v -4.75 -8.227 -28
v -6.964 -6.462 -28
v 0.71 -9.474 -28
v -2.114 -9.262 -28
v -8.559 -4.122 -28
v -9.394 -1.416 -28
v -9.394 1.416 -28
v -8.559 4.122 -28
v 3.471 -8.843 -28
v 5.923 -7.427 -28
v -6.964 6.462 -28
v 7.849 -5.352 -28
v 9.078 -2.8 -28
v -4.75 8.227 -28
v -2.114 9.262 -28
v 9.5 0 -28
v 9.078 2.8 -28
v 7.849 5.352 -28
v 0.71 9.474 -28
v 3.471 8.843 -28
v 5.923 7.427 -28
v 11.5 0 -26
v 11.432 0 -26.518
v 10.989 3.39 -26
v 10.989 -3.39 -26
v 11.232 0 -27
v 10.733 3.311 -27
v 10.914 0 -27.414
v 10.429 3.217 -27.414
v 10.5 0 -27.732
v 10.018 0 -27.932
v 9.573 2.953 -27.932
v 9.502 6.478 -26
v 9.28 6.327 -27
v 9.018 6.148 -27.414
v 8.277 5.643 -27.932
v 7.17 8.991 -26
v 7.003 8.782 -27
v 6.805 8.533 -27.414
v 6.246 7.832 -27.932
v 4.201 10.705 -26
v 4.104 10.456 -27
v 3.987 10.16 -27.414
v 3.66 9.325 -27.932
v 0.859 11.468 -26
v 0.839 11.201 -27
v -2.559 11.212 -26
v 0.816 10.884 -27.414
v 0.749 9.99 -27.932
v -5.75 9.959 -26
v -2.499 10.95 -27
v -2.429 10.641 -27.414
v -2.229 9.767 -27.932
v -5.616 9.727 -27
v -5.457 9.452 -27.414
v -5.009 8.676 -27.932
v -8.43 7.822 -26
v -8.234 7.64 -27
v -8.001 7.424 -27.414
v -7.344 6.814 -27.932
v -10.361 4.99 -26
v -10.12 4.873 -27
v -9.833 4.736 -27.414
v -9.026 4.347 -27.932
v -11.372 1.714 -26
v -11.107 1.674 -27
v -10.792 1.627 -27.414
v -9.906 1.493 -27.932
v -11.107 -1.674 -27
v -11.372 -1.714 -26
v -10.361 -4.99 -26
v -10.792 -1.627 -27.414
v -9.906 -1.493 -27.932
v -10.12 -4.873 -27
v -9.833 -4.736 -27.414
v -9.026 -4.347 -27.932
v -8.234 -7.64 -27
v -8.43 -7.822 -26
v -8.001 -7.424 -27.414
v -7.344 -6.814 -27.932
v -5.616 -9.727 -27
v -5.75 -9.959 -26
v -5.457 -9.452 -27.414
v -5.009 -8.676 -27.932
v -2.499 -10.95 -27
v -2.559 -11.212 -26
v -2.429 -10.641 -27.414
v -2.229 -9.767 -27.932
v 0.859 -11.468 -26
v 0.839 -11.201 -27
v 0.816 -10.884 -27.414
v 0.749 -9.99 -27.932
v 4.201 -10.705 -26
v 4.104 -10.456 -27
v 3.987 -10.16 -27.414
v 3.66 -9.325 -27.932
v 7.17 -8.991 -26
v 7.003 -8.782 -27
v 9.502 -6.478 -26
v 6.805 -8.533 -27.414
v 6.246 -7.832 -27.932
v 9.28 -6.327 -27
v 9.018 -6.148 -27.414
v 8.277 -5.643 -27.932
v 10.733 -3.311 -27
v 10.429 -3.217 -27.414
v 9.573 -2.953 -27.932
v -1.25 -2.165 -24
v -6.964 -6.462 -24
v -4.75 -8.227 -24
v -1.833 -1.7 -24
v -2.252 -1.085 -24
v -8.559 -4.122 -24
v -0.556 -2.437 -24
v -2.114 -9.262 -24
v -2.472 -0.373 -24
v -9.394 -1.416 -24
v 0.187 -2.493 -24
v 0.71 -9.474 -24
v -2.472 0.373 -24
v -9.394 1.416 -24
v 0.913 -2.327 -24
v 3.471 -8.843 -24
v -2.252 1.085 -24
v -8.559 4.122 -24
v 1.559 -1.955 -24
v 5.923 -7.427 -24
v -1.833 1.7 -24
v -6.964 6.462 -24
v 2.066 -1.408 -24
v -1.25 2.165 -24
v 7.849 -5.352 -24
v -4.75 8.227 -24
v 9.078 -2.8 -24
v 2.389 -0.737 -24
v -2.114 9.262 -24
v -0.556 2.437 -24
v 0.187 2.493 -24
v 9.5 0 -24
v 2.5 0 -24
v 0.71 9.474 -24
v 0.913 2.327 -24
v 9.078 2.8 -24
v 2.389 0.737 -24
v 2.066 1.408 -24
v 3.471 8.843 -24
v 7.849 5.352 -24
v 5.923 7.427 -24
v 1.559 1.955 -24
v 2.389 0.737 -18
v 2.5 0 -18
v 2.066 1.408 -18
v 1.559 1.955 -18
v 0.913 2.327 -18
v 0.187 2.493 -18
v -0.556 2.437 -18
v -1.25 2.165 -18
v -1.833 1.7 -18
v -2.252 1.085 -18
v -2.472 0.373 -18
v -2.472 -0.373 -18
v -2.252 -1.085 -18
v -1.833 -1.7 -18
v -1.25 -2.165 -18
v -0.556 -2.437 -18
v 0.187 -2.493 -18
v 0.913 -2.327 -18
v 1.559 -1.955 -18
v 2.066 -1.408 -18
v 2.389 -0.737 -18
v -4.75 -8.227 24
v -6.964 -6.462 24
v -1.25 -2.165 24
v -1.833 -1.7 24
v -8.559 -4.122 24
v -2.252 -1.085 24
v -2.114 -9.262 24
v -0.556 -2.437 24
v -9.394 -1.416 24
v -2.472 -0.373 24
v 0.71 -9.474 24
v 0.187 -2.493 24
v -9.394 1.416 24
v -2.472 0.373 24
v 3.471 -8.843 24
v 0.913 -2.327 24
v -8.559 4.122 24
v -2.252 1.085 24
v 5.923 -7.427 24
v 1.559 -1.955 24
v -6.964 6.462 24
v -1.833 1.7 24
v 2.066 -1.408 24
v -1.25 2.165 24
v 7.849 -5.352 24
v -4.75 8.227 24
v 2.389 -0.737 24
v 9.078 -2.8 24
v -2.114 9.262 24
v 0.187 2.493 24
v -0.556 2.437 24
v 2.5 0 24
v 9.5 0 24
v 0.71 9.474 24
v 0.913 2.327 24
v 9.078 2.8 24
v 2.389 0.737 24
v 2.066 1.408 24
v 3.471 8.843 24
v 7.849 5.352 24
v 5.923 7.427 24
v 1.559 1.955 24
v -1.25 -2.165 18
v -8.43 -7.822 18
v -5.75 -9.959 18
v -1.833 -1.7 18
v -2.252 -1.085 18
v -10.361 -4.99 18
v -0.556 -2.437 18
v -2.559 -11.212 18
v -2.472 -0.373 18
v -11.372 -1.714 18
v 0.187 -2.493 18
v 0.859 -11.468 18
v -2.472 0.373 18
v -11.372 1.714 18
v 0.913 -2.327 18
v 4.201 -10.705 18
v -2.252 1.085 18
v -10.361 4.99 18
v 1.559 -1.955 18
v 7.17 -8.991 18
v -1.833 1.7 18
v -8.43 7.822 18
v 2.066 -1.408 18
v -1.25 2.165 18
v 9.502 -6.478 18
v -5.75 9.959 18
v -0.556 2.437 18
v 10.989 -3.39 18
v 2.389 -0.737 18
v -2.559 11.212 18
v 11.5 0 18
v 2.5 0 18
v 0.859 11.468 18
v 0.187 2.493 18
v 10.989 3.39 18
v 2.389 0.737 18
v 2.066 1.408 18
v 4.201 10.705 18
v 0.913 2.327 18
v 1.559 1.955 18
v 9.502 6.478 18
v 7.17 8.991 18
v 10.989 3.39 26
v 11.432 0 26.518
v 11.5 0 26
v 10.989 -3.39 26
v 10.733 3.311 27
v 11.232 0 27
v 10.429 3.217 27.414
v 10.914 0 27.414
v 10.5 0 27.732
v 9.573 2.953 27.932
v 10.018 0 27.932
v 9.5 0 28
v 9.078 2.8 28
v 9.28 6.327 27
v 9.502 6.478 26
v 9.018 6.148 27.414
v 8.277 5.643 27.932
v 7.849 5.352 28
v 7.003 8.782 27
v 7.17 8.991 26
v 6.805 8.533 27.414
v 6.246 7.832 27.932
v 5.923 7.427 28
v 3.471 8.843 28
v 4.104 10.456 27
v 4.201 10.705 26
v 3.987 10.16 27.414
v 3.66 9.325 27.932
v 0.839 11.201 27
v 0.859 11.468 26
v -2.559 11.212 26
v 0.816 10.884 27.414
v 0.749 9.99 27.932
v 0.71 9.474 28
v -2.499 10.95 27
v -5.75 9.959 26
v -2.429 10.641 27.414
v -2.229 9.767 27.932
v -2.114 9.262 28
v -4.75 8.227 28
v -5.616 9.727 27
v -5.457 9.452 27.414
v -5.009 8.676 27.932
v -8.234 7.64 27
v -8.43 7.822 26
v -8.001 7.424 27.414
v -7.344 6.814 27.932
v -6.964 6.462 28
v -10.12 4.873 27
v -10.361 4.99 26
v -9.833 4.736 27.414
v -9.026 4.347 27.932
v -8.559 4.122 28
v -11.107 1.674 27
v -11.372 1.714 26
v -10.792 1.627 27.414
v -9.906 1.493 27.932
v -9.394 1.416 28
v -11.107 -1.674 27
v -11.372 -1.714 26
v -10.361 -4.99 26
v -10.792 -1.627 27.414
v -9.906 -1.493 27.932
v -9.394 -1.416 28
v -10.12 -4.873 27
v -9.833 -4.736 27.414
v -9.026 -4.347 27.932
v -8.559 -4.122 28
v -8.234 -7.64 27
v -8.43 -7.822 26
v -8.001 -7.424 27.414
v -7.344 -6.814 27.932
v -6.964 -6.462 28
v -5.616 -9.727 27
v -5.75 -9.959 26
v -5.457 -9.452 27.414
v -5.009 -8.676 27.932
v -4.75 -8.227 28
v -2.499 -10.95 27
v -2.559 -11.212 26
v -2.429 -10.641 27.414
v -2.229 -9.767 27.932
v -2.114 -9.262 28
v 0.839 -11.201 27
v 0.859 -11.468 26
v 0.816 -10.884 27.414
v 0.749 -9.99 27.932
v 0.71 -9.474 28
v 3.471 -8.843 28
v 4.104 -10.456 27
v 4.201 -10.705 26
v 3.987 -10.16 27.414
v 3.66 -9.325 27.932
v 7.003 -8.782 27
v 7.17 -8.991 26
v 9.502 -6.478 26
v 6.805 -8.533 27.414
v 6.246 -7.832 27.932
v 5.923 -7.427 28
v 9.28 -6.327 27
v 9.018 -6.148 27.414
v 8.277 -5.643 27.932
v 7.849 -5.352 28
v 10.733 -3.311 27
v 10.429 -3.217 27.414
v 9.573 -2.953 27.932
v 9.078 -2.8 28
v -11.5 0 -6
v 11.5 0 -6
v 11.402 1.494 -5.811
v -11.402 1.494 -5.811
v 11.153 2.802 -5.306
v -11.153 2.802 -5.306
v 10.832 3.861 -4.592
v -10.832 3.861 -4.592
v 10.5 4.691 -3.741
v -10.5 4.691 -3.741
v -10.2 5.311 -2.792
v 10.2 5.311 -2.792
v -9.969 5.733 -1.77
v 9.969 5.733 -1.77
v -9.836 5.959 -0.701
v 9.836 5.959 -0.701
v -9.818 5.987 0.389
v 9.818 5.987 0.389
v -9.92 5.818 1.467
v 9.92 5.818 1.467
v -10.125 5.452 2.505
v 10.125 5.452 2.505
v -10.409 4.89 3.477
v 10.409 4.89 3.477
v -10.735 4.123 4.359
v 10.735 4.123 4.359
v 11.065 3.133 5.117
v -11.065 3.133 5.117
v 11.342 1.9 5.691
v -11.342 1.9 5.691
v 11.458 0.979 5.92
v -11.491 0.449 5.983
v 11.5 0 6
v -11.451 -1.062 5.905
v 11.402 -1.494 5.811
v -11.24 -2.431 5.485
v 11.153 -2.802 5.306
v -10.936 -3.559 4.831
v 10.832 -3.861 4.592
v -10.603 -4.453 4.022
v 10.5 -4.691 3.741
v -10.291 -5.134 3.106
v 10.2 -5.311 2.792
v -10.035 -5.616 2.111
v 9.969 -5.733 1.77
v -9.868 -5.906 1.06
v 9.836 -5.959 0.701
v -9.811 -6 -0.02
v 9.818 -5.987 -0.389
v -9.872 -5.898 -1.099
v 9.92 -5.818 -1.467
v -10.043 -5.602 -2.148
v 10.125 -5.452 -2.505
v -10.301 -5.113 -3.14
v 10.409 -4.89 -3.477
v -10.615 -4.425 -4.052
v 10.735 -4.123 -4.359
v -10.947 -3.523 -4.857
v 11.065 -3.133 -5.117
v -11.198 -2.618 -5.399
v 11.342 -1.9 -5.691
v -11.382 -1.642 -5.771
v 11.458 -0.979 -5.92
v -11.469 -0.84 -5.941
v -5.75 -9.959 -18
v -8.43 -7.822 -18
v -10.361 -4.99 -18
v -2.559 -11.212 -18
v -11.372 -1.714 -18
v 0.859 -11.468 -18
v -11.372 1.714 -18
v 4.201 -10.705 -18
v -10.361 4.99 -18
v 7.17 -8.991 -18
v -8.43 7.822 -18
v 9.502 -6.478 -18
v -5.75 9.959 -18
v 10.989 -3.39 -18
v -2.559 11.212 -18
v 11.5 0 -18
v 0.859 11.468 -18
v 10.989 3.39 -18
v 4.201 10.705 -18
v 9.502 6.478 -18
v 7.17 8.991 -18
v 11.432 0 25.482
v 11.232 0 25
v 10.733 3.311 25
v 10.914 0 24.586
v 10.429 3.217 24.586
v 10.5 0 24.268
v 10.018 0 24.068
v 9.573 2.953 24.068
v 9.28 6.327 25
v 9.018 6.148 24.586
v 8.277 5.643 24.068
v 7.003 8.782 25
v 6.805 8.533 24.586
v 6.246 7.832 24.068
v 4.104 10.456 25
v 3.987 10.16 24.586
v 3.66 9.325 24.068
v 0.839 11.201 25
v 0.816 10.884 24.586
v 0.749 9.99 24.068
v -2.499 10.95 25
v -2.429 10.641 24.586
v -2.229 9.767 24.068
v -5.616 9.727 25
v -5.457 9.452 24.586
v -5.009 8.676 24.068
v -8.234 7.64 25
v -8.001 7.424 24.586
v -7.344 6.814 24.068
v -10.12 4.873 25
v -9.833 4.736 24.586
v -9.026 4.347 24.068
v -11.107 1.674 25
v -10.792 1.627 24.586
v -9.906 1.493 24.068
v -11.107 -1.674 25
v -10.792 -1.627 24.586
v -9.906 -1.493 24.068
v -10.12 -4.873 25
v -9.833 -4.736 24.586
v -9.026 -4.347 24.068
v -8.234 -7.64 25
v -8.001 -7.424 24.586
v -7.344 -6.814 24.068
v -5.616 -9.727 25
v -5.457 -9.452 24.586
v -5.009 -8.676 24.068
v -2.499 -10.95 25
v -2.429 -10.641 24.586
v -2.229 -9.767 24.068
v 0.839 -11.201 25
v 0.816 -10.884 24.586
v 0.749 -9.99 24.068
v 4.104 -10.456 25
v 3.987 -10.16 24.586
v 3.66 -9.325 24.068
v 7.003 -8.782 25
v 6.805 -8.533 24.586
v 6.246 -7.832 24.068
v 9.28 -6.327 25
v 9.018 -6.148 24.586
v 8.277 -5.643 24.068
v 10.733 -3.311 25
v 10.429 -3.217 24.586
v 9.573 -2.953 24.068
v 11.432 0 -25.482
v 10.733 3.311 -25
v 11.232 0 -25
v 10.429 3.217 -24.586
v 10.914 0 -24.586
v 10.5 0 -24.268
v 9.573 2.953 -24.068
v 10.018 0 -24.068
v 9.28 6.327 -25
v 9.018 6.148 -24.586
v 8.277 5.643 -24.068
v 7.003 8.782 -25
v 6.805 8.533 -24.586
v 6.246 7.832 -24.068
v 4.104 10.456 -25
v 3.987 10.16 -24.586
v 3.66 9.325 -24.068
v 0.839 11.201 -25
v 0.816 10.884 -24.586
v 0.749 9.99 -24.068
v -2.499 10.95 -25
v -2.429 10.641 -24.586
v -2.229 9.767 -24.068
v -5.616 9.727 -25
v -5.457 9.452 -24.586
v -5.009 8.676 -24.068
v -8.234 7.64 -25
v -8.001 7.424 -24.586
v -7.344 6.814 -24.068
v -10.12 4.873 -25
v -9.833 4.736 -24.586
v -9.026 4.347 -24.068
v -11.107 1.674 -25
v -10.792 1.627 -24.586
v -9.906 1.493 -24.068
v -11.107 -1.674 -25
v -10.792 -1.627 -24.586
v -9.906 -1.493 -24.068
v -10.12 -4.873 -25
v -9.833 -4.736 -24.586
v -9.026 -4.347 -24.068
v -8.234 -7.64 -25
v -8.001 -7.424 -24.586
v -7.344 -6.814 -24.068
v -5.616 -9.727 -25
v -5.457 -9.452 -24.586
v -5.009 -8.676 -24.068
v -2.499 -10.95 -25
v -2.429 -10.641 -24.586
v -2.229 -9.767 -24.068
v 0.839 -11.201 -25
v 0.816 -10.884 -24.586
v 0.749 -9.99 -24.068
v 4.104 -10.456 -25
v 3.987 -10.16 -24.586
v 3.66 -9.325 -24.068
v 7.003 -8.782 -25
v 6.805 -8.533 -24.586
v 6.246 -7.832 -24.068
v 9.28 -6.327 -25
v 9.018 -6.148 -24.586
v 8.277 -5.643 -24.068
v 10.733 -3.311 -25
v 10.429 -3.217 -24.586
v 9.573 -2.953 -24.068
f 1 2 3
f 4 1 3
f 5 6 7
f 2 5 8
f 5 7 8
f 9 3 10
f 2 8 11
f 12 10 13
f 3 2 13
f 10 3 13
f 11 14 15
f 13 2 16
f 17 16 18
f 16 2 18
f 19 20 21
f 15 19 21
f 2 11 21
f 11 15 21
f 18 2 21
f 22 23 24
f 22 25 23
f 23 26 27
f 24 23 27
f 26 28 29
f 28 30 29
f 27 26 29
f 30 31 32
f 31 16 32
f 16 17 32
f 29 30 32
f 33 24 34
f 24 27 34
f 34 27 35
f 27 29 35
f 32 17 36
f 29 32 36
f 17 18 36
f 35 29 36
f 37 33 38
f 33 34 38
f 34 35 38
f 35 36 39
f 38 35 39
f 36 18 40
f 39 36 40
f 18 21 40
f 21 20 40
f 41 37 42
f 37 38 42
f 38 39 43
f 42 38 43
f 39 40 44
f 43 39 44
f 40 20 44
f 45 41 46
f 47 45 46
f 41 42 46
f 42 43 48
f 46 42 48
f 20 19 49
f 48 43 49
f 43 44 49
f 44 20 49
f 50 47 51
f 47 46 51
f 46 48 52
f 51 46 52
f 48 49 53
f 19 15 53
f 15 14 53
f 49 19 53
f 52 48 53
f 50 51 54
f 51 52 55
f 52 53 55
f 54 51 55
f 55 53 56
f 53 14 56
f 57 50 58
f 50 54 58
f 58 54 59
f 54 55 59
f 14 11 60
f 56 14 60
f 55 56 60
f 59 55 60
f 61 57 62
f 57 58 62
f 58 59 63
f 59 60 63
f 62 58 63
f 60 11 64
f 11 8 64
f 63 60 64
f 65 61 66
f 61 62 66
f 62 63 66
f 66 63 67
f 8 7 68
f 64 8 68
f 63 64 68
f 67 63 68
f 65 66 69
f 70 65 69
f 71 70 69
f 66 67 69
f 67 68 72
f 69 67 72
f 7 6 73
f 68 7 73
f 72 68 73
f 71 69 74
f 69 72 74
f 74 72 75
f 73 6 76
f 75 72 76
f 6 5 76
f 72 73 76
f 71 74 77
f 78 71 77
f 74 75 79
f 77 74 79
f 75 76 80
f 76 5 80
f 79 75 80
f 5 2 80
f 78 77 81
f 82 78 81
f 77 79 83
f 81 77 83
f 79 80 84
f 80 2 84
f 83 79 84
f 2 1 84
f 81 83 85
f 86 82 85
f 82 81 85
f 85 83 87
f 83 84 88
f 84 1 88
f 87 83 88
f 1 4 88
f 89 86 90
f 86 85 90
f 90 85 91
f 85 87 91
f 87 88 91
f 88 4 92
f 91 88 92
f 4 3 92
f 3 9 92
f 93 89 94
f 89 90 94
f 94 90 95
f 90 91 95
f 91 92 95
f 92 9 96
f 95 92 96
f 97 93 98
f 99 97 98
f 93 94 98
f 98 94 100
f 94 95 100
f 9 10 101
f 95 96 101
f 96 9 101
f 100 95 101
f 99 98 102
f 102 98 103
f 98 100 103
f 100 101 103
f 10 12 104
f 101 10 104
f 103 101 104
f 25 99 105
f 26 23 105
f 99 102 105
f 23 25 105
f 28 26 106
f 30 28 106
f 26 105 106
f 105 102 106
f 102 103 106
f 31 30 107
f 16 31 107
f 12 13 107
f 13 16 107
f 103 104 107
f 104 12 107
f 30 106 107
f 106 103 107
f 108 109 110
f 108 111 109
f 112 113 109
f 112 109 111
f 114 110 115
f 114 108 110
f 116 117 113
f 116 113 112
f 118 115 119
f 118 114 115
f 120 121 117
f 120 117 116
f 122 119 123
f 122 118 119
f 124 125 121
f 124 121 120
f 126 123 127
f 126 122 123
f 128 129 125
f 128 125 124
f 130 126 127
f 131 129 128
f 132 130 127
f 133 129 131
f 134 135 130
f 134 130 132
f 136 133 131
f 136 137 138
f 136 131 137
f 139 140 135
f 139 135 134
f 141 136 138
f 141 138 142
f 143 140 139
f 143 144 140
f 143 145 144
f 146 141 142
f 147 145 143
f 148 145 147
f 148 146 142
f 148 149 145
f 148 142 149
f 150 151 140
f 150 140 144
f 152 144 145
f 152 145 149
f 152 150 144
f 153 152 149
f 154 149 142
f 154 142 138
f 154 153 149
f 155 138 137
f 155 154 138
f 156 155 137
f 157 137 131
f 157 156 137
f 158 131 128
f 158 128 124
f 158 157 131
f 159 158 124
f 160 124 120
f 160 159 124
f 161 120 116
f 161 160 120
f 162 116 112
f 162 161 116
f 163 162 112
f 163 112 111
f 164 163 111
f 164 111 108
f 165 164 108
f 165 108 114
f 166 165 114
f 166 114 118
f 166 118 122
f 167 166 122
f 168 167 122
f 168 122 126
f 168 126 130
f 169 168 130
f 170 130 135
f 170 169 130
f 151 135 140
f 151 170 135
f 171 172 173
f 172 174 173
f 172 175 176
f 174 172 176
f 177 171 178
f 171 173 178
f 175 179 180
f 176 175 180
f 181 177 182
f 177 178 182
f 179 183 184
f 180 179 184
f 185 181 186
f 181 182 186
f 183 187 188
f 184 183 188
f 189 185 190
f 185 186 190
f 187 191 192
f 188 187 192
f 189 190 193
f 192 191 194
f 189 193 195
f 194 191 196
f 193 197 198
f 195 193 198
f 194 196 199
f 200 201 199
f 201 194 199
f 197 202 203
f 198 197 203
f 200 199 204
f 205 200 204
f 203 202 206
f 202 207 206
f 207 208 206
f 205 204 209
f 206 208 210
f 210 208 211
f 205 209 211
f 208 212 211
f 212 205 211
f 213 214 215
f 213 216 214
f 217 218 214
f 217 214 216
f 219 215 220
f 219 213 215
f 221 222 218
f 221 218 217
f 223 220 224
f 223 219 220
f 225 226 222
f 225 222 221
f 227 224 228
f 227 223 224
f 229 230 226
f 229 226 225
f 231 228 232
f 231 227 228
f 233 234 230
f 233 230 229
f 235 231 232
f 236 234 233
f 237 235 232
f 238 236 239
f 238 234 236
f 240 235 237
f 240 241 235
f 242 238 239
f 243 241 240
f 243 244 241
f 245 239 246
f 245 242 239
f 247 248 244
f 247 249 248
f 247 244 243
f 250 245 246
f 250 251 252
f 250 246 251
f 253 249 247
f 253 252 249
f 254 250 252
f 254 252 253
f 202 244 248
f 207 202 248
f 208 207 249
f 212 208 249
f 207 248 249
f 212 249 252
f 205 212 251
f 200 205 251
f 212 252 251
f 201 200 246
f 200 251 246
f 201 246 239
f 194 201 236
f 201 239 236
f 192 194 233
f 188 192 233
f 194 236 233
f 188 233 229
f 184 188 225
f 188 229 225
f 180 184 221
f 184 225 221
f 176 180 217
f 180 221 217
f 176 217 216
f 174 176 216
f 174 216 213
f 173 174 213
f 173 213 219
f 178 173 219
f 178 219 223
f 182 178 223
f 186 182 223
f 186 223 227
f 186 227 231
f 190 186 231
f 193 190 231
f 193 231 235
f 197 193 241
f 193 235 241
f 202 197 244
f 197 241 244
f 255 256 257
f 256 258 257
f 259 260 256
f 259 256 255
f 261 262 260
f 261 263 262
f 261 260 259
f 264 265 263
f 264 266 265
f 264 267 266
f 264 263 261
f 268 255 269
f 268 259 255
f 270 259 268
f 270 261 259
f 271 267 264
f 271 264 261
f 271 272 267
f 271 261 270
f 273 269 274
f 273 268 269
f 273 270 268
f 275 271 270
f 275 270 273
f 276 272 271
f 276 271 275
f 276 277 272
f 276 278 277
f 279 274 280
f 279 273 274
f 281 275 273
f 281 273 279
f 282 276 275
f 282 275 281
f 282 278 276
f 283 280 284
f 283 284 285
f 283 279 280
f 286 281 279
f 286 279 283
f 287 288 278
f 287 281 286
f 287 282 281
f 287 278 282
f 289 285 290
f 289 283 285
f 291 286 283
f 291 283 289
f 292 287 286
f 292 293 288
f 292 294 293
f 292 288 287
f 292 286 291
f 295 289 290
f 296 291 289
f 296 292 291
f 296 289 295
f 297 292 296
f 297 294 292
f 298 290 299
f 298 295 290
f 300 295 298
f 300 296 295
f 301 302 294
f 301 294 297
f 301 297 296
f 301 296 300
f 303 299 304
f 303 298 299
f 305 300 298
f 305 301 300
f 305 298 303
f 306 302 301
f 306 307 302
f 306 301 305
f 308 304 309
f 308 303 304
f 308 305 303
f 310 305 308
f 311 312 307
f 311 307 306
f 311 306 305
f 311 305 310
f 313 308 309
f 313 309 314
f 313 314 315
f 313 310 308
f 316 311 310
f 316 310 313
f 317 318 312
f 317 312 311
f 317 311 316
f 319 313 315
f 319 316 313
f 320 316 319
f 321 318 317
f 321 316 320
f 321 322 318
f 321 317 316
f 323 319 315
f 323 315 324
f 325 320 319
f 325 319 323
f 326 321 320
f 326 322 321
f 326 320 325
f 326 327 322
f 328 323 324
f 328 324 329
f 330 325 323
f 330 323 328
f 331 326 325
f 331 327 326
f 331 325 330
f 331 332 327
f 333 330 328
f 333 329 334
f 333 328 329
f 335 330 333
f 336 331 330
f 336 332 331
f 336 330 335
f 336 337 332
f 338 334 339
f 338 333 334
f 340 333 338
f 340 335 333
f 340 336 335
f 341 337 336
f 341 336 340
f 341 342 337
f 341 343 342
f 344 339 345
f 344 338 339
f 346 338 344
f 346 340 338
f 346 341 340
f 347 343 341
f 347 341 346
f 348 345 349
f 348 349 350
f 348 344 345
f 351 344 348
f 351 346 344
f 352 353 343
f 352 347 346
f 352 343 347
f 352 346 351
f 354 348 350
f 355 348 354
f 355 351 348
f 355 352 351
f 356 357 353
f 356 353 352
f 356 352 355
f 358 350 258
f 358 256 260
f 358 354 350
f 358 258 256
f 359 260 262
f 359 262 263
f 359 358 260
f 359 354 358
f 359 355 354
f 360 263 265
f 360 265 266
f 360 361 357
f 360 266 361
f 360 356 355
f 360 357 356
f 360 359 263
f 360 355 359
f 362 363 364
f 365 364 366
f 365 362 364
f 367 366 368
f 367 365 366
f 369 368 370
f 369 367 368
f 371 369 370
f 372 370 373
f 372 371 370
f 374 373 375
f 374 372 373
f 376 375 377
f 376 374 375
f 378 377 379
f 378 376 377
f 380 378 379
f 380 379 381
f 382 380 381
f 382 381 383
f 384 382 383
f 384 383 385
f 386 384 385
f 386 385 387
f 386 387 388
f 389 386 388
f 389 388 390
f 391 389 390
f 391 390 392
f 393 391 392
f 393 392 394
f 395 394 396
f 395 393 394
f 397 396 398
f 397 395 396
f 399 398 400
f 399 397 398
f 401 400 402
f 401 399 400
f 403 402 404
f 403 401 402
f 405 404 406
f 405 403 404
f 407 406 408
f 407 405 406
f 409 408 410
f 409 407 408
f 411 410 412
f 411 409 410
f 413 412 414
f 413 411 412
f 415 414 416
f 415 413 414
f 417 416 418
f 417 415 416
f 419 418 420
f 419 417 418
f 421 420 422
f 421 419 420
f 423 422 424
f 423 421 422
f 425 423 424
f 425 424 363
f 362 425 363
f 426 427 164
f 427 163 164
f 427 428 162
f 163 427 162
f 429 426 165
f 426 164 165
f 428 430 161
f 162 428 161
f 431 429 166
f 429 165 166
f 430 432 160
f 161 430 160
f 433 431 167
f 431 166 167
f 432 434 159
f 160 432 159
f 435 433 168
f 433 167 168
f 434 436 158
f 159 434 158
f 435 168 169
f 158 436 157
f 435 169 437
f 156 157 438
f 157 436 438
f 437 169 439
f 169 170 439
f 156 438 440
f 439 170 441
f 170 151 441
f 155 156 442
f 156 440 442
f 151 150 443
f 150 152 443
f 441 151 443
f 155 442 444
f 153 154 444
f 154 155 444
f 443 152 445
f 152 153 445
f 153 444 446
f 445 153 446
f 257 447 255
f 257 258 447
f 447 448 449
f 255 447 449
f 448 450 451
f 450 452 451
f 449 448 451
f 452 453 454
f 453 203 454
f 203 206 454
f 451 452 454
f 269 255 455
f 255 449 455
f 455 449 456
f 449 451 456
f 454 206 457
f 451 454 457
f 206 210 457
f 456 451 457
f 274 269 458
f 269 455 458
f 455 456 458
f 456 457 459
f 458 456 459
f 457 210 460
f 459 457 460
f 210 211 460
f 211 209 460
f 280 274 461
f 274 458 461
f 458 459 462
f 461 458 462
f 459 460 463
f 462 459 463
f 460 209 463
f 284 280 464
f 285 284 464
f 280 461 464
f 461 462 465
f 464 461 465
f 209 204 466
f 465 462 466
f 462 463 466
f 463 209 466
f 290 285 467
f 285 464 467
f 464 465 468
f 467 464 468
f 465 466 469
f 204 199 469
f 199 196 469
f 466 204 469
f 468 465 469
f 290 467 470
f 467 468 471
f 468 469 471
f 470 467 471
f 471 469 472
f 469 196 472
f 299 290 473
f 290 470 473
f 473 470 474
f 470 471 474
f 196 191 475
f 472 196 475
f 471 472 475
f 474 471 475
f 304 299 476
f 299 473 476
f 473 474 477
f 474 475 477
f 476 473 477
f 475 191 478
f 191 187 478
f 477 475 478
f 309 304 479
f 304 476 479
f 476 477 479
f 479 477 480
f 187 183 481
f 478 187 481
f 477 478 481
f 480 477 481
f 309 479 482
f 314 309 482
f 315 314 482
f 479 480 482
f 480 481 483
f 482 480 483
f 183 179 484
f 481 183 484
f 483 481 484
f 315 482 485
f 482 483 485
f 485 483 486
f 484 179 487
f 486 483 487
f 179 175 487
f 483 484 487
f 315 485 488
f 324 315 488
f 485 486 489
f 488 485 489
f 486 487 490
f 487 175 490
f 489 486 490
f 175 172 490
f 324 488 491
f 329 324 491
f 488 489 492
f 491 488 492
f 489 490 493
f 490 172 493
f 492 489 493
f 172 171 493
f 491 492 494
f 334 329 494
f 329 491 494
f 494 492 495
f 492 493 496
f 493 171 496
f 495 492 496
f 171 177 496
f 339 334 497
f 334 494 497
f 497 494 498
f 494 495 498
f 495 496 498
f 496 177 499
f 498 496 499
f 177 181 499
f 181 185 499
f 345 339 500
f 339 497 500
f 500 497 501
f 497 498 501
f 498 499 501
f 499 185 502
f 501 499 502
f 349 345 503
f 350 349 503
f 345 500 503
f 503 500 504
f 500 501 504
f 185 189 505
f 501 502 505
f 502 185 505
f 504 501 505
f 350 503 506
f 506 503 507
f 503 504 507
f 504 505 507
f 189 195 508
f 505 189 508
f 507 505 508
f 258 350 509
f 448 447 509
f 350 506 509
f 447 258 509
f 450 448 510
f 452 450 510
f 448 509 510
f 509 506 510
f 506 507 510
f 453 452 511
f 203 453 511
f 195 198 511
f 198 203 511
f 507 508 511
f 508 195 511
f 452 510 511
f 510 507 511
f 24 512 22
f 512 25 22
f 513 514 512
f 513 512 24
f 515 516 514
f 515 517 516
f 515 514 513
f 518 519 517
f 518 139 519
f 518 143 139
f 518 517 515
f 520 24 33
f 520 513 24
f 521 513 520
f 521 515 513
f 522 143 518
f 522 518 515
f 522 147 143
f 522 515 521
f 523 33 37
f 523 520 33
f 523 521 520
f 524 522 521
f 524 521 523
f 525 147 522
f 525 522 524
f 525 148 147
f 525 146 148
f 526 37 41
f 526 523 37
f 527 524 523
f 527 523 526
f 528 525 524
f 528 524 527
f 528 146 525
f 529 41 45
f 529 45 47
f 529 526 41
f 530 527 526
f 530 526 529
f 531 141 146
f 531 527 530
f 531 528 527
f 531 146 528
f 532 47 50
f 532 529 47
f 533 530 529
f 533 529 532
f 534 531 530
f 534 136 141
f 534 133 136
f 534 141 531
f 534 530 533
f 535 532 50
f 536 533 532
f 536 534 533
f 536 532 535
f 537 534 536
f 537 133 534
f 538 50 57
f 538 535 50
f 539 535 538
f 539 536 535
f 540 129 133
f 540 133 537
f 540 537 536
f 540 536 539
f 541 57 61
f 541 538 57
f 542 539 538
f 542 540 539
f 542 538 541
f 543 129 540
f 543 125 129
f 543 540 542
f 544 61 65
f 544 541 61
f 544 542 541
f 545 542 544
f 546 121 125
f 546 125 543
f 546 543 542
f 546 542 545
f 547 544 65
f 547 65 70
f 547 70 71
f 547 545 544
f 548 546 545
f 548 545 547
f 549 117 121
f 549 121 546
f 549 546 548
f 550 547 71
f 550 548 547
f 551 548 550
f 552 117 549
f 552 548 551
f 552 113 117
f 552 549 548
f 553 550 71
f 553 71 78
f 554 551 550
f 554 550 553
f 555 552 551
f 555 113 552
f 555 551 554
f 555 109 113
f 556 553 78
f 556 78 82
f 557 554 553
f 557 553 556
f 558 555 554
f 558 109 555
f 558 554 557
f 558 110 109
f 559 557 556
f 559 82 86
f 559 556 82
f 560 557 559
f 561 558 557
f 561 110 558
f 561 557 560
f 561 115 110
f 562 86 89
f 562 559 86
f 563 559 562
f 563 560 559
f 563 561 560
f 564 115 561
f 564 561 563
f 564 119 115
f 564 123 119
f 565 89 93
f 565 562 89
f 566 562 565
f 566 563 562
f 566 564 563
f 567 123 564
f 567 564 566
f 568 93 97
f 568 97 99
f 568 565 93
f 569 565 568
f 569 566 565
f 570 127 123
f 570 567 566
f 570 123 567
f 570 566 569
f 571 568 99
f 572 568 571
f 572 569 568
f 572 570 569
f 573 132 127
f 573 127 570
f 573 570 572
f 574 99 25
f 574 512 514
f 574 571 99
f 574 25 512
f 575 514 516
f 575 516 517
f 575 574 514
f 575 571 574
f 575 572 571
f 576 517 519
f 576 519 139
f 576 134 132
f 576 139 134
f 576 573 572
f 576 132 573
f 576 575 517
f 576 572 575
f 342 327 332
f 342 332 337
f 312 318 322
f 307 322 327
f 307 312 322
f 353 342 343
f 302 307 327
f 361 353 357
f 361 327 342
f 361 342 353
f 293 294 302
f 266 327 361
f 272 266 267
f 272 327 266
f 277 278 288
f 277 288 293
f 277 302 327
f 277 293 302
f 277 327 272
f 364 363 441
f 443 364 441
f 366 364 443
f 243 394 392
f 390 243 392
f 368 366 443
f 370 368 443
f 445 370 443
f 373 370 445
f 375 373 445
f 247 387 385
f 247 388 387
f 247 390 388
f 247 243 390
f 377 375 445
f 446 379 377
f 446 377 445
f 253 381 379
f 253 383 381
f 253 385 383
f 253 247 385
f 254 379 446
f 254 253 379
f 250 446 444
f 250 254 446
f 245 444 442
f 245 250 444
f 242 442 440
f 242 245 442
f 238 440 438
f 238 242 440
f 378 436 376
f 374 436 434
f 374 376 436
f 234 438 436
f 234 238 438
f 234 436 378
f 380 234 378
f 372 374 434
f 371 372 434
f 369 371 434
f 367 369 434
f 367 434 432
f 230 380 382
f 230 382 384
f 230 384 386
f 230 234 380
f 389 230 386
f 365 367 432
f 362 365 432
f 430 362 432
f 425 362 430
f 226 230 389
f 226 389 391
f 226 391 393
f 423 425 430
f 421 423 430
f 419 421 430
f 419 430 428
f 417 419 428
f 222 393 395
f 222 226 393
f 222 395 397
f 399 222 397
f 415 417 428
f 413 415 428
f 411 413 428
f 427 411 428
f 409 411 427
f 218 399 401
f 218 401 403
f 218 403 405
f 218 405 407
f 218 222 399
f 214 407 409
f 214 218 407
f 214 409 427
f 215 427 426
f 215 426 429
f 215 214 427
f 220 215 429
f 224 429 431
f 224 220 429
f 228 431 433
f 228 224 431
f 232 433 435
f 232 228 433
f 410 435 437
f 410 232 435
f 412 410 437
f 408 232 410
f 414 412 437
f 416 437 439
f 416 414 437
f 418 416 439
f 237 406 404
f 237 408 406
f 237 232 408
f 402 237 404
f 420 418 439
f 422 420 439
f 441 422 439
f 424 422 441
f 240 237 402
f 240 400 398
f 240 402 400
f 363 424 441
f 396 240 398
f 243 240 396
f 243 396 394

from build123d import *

# Parameters (mm, degrees)
SKETCH1_R               = 11.5
BOSS_EXTRUDE1_DEPTH     = 18
SKETCH2_R               = 2.5
BOSS_EXTRUDE2_DEPTH     = 6
SKETCH3_R               = 11.5
BOSS_EXTRUDE3_DEPTH     = 4
FILLET1_R               = 2
CUT_EXTRUDE2_DEPTH      = 33.380549753
CUT_EXTRUDE2_DEPTH_BACK = 33.380549753
SKETCH5_R               = 6


with BuildPart() as part:
    # Sketch1 → Boss-Extrude1 (new body)
    with BuildSketch(Plane.XY):
        Circle(SKETCH1_R)
    extrude(amount=BOSS_EXTRUDE1_DEPTH)

    # Sketch2 → Boss-Extrude2 (add)
    with BuildSketch(Plane.XY.offset(18)):
        Circle(SKETCH2_R)
    extrude(amount=BOSS_EXTRUDE2_DEPTH)

    # Sketch3 → Boss-Extrude3 (add)
    with BuildSketch(Plane.XY.offset(24)):
        Circle(SKETCH3_R)
    extrude(amount=BOSS_EXTRUDE3_DEPTH)

    # Fillet1
    fillet1_edges = [part.edges().sort_by_distance(p)[0] for p in [
        (-11.5, 0, 24),
        (-11.5, 0, 28),
    ]]
    fillet(fillet1_edges, radius=FILLET1_R - 0.0001)  # a hair under: the kernel refuses the full size

    # Mirror1: part across plane


with BuildPart() as part_1:
    add(part.part)
    add(part.part.mirror(Plane.XY))

    # Sketch5 → Cut-Extrude2 (cut, two sides: drawn at the far end of the back side and taken through both)
    with BuildSketch(Plane(origin=(0, 0, 0), x_dir=(0, 0, -1), z_dir=(1, 0, 0)).offset(-CUT_EXTRUDE2_DEPTH_BACK)):
        Circle(SKETCH5_R)
    extrude(amount=CUT_EXTRUDE2_DEPTH + CUT_EXTRUDE2_DEPTH_BACK, mode=Mode.SUBTRACT)


solid = part_1.part
